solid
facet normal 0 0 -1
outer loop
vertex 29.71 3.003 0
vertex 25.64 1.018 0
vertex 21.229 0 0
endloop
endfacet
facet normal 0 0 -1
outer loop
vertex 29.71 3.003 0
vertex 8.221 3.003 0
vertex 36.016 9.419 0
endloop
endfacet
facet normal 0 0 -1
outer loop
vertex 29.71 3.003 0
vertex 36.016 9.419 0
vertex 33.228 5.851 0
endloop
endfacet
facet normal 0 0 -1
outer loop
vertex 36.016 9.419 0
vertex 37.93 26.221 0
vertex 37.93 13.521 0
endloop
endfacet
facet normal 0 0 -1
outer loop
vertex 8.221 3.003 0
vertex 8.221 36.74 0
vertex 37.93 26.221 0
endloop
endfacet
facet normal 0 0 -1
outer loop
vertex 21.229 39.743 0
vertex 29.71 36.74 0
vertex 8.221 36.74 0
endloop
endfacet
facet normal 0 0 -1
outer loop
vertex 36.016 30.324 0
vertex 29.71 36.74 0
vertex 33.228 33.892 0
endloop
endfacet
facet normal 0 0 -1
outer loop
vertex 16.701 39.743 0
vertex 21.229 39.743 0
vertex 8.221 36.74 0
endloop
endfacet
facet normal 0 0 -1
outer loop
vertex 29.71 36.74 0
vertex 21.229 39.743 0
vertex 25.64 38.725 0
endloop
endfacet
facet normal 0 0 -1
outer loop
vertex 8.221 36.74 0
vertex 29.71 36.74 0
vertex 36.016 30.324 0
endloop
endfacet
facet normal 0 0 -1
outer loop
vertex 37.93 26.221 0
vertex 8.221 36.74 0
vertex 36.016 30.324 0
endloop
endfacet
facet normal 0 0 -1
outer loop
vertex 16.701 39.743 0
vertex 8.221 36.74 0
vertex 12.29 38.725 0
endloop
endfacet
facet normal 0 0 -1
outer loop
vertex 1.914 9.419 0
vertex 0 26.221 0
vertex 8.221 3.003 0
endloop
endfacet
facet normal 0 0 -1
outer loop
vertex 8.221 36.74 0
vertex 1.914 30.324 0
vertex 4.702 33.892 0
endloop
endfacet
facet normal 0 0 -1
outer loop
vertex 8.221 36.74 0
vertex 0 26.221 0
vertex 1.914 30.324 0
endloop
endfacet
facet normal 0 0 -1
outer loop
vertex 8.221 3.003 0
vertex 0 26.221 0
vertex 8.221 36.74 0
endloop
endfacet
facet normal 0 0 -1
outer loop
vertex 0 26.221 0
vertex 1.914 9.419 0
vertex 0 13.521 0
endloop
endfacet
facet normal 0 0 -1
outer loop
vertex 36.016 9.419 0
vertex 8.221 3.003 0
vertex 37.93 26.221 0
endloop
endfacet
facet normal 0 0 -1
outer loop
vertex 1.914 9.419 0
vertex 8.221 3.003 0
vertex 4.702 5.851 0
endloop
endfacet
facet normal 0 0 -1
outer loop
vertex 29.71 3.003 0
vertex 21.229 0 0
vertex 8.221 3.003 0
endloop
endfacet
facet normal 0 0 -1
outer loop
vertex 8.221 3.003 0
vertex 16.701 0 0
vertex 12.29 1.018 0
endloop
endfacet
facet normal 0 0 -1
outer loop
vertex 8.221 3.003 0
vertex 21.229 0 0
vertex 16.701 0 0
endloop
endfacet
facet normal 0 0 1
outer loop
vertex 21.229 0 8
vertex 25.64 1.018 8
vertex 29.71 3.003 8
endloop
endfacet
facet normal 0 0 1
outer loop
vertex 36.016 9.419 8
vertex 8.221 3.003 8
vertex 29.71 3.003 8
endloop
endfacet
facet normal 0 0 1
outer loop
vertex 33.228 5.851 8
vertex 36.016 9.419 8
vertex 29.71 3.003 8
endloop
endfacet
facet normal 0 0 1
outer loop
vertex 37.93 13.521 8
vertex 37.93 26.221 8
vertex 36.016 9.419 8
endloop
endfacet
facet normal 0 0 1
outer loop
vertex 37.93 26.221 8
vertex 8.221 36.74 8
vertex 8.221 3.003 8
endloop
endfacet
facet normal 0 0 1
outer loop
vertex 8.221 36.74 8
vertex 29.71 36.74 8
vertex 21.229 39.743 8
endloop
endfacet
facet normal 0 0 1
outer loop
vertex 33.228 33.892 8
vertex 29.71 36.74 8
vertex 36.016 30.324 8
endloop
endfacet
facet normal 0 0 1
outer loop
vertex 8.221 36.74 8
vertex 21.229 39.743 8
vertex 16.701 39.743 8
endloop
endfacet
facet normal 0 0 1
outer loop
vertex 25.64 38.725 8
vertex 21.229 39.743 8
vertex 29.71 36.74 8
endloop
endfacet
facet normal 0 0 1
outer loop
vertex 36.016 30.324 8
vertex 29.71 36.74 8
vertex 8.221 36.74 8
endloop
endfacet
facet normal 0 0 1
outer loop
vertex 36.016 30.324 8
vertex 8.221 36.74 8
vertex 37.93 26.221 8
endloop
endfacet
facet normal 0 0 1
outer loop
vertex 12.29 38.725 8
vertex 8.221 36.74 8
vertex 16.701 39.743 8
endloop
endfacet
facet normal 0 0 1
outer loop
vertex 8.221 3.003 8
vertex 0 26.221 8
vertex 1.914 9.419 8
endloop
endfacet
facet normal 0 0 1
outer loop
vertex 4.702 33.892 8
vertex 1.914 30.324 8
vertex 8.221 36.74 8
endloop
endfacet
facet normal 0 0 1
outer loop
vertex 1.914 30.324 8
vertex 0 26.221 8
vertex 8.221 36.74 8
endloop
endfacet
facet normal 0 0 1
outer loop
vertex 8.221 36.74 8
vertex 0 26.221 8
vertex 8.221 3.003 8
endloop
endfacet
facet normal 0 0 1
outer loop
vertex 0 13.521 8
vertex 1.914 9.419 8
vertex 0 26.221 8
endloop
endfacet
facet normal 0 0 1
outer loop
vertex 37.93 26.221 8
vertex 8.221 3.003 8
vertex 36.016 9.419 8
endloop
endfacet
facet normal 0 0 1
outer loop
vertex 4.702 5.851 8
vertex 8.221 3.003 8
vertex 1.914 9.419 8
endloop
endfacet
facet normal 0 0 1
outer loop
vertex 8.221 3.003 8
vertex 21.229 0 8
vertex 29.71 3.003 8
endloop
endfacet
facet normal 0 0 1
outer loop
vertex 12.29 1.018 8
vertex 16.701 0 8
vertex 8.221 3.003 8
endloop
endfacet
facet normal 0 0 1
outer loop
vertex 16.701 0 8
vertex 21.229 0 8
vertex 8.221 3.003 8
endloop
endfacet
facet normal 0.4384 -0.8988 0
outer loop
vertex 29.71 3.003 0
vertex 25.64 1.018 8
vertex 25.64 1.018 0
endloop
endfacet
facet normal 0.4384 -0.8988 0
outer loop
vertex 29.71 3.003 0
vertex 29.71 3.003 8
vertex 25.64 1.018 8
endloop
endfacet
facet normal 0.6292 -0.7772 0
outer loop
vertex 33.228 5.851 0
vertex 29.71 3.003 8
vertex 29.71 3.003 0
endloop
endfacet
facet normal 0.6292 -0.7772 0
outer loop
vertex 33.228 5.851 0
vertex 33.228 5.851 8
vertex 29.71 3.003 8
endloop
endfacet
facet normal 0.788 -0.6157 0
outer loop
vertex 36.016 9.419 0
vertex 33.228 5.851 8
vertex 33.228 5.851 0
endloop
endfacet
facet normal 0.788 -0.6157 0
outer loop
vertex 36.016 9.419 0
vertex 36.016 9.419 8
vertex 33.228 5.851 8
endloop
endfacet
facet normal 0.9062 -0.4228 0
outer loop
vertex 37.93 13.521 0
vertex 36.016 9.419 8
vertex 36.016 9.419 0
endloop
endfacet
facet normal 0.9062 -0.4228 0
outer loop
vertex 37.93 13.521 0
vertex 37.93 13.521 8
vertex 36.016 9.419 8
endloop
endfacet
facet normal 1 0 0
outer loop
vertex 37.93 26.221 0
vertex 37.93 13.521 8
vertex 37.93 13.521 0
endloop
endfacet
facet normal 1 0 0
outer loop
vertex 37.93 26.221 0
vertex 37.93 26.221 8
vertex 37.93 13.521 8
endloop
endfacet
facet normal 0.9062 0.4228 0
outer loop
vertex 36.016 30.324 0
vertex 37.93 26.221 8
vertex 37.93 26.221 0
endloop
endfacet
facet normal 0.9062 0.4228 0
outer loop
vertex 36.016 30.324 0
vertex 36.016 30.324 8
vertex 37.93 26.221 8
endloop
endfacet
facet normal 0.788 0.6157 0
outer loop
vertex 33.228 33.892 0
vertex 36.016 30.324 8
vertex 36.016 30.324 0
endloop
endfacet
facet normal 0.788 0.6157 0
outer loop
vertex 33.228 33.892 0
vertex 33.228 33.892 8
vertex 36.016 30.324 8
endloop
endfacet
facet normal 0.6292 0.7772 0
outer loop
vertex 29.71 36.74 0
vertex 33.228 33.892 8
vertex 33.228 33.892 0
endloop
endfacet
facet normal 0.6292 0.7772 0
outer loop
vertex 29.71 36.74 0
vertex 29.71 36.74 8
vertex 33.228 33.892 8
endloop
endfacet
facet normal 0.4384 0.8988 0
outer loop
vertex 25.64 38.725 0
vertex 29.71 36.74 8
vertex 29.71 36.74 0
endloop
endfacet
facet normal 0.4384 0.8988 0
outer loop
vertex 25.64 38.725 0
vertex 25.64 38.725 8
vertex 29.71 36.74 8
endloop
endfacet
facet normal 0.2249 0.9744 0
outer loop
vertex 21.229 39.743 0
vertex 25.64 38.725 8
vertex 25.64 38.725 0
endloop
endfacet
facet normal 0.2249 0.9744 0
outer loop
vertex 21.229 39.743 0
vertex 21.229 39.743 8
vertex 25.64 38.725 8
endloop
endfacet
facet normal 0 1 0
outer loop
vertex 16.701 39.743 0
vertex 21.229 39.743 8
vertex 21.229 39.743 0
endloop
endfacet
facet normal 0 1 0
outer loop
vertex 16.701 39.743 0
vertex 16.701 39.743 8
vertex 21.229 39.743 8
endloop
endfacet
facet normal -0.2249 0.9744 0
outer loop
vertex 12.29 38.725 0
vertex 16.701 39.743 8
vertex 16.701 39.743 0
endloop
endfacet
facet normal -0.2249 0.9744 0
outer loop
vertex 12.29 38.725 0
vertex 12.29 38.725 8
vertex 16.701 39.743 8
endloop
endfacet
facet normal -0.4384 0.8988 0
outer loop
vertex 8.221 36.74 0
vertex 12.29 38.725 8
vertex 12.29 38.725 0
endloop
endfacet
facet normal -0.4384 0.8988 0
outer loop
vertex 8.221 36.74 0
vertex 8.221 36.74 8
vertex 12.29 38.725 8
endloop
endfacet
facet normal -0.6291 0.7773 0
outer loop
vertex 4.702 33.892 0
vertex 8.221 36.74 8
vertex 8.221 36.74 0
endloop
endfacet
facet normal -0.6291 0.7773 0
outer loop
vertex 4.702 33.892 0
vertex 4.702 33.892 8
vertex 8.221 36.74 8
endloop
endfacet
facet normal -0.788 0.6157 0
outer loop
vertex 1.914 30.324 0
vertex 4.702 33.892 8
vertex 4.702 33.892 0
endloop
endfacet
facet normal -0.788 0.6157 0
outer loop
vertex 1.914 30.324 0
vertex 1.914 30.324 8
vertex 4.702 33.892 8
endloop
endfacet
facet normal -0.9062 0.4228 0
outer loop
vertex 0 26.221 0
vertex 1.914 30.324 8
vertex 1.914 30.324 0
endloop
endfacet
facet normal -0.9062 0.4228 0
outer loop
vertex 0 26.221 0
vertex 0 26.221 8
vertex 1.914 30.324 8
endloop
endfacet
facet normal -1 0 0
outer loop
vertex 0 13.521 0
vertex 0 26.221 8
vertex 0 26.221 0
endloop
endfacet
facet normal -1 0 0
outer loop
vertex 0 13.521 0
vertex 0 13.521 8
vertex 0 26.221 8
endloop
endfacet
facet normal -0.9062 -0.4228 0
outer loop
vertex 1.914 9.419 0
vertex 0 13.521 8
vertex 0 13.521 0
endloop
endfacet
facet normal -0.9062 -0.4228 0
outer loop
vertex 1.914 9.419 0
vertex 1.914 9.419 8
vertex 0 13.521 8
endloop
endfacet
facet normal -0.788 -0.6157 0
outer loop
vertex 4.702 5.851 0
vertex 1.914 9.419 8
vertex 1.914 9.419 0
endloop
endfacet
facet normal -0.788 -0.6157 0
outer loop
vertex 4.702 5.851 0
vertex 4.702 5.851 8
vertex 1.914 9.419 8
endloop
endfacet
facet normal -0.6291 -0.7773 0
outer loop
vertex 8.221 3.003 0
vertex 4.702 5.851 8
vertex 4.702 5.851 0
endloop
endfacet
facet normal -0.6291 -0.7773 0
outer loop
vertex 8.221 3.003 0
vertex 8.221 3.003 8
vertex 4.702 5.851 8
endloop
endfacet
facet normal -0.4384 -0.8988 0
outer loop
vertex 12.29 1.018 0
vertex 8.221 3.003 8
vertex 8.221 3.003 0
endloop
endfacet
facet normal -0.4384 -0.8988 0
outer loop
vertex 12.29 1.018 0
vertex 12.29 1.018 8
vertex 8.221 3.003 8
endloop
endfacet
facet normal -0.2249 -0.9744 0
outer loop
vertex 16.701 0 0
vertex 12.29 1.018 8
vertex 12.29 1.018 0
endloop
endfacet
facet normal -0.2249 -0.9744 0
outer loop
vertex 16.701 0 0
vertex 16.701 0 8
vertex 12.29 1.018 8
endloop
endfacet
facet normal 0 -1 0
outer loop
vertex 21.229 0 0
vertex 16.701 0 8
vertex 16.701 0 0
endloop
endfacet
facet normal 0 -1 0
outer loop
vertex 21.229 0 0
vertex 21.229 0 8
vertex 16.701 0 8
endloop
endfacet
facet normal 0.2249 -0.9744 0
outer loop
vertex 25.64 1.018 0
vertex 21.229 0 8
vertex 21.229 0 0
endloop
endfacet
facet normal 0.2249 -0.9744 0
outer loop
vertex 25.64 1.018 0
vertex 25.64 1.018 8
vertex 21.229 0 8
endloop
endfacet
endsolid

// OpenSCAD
$fn = 32;

// ----------------------------------------------------------------------
// Flat adaptor: double_d, 8 mm thick
// ----------------------------------------------------------------------

// --- parameters (mm) ---
profile_height = 8;       // extrusion height
profile_points = 24;      // points of the closed outline

profile = [[37.93, 26.221], [36.016, 30.324], [33.228, 33.892], [29.71, 36.74], [25.64, 38.725], [21.229, 39.743], [16.701, 39.743], [12.29, 38.725], [8.221, 36.74], [4.702, 33.892], [1.914, 30.324], [0, 26.221], [0, 13.521], [1.914, 9.419], [4.702, 5.851], [8.221, 3.003], [12.29, 1.018], [16.701, 0], [21.229, 0], [25.64, 1.018], [29.71, 3.003], [33.228, 5.851], [36.016, 9.419], [37.93, 13.521]];  // single closed polygon, 24 points, counter clockwise

// --- the one profile operation ---
linear_extrude(height = profile_height) polygon(points = profile);
